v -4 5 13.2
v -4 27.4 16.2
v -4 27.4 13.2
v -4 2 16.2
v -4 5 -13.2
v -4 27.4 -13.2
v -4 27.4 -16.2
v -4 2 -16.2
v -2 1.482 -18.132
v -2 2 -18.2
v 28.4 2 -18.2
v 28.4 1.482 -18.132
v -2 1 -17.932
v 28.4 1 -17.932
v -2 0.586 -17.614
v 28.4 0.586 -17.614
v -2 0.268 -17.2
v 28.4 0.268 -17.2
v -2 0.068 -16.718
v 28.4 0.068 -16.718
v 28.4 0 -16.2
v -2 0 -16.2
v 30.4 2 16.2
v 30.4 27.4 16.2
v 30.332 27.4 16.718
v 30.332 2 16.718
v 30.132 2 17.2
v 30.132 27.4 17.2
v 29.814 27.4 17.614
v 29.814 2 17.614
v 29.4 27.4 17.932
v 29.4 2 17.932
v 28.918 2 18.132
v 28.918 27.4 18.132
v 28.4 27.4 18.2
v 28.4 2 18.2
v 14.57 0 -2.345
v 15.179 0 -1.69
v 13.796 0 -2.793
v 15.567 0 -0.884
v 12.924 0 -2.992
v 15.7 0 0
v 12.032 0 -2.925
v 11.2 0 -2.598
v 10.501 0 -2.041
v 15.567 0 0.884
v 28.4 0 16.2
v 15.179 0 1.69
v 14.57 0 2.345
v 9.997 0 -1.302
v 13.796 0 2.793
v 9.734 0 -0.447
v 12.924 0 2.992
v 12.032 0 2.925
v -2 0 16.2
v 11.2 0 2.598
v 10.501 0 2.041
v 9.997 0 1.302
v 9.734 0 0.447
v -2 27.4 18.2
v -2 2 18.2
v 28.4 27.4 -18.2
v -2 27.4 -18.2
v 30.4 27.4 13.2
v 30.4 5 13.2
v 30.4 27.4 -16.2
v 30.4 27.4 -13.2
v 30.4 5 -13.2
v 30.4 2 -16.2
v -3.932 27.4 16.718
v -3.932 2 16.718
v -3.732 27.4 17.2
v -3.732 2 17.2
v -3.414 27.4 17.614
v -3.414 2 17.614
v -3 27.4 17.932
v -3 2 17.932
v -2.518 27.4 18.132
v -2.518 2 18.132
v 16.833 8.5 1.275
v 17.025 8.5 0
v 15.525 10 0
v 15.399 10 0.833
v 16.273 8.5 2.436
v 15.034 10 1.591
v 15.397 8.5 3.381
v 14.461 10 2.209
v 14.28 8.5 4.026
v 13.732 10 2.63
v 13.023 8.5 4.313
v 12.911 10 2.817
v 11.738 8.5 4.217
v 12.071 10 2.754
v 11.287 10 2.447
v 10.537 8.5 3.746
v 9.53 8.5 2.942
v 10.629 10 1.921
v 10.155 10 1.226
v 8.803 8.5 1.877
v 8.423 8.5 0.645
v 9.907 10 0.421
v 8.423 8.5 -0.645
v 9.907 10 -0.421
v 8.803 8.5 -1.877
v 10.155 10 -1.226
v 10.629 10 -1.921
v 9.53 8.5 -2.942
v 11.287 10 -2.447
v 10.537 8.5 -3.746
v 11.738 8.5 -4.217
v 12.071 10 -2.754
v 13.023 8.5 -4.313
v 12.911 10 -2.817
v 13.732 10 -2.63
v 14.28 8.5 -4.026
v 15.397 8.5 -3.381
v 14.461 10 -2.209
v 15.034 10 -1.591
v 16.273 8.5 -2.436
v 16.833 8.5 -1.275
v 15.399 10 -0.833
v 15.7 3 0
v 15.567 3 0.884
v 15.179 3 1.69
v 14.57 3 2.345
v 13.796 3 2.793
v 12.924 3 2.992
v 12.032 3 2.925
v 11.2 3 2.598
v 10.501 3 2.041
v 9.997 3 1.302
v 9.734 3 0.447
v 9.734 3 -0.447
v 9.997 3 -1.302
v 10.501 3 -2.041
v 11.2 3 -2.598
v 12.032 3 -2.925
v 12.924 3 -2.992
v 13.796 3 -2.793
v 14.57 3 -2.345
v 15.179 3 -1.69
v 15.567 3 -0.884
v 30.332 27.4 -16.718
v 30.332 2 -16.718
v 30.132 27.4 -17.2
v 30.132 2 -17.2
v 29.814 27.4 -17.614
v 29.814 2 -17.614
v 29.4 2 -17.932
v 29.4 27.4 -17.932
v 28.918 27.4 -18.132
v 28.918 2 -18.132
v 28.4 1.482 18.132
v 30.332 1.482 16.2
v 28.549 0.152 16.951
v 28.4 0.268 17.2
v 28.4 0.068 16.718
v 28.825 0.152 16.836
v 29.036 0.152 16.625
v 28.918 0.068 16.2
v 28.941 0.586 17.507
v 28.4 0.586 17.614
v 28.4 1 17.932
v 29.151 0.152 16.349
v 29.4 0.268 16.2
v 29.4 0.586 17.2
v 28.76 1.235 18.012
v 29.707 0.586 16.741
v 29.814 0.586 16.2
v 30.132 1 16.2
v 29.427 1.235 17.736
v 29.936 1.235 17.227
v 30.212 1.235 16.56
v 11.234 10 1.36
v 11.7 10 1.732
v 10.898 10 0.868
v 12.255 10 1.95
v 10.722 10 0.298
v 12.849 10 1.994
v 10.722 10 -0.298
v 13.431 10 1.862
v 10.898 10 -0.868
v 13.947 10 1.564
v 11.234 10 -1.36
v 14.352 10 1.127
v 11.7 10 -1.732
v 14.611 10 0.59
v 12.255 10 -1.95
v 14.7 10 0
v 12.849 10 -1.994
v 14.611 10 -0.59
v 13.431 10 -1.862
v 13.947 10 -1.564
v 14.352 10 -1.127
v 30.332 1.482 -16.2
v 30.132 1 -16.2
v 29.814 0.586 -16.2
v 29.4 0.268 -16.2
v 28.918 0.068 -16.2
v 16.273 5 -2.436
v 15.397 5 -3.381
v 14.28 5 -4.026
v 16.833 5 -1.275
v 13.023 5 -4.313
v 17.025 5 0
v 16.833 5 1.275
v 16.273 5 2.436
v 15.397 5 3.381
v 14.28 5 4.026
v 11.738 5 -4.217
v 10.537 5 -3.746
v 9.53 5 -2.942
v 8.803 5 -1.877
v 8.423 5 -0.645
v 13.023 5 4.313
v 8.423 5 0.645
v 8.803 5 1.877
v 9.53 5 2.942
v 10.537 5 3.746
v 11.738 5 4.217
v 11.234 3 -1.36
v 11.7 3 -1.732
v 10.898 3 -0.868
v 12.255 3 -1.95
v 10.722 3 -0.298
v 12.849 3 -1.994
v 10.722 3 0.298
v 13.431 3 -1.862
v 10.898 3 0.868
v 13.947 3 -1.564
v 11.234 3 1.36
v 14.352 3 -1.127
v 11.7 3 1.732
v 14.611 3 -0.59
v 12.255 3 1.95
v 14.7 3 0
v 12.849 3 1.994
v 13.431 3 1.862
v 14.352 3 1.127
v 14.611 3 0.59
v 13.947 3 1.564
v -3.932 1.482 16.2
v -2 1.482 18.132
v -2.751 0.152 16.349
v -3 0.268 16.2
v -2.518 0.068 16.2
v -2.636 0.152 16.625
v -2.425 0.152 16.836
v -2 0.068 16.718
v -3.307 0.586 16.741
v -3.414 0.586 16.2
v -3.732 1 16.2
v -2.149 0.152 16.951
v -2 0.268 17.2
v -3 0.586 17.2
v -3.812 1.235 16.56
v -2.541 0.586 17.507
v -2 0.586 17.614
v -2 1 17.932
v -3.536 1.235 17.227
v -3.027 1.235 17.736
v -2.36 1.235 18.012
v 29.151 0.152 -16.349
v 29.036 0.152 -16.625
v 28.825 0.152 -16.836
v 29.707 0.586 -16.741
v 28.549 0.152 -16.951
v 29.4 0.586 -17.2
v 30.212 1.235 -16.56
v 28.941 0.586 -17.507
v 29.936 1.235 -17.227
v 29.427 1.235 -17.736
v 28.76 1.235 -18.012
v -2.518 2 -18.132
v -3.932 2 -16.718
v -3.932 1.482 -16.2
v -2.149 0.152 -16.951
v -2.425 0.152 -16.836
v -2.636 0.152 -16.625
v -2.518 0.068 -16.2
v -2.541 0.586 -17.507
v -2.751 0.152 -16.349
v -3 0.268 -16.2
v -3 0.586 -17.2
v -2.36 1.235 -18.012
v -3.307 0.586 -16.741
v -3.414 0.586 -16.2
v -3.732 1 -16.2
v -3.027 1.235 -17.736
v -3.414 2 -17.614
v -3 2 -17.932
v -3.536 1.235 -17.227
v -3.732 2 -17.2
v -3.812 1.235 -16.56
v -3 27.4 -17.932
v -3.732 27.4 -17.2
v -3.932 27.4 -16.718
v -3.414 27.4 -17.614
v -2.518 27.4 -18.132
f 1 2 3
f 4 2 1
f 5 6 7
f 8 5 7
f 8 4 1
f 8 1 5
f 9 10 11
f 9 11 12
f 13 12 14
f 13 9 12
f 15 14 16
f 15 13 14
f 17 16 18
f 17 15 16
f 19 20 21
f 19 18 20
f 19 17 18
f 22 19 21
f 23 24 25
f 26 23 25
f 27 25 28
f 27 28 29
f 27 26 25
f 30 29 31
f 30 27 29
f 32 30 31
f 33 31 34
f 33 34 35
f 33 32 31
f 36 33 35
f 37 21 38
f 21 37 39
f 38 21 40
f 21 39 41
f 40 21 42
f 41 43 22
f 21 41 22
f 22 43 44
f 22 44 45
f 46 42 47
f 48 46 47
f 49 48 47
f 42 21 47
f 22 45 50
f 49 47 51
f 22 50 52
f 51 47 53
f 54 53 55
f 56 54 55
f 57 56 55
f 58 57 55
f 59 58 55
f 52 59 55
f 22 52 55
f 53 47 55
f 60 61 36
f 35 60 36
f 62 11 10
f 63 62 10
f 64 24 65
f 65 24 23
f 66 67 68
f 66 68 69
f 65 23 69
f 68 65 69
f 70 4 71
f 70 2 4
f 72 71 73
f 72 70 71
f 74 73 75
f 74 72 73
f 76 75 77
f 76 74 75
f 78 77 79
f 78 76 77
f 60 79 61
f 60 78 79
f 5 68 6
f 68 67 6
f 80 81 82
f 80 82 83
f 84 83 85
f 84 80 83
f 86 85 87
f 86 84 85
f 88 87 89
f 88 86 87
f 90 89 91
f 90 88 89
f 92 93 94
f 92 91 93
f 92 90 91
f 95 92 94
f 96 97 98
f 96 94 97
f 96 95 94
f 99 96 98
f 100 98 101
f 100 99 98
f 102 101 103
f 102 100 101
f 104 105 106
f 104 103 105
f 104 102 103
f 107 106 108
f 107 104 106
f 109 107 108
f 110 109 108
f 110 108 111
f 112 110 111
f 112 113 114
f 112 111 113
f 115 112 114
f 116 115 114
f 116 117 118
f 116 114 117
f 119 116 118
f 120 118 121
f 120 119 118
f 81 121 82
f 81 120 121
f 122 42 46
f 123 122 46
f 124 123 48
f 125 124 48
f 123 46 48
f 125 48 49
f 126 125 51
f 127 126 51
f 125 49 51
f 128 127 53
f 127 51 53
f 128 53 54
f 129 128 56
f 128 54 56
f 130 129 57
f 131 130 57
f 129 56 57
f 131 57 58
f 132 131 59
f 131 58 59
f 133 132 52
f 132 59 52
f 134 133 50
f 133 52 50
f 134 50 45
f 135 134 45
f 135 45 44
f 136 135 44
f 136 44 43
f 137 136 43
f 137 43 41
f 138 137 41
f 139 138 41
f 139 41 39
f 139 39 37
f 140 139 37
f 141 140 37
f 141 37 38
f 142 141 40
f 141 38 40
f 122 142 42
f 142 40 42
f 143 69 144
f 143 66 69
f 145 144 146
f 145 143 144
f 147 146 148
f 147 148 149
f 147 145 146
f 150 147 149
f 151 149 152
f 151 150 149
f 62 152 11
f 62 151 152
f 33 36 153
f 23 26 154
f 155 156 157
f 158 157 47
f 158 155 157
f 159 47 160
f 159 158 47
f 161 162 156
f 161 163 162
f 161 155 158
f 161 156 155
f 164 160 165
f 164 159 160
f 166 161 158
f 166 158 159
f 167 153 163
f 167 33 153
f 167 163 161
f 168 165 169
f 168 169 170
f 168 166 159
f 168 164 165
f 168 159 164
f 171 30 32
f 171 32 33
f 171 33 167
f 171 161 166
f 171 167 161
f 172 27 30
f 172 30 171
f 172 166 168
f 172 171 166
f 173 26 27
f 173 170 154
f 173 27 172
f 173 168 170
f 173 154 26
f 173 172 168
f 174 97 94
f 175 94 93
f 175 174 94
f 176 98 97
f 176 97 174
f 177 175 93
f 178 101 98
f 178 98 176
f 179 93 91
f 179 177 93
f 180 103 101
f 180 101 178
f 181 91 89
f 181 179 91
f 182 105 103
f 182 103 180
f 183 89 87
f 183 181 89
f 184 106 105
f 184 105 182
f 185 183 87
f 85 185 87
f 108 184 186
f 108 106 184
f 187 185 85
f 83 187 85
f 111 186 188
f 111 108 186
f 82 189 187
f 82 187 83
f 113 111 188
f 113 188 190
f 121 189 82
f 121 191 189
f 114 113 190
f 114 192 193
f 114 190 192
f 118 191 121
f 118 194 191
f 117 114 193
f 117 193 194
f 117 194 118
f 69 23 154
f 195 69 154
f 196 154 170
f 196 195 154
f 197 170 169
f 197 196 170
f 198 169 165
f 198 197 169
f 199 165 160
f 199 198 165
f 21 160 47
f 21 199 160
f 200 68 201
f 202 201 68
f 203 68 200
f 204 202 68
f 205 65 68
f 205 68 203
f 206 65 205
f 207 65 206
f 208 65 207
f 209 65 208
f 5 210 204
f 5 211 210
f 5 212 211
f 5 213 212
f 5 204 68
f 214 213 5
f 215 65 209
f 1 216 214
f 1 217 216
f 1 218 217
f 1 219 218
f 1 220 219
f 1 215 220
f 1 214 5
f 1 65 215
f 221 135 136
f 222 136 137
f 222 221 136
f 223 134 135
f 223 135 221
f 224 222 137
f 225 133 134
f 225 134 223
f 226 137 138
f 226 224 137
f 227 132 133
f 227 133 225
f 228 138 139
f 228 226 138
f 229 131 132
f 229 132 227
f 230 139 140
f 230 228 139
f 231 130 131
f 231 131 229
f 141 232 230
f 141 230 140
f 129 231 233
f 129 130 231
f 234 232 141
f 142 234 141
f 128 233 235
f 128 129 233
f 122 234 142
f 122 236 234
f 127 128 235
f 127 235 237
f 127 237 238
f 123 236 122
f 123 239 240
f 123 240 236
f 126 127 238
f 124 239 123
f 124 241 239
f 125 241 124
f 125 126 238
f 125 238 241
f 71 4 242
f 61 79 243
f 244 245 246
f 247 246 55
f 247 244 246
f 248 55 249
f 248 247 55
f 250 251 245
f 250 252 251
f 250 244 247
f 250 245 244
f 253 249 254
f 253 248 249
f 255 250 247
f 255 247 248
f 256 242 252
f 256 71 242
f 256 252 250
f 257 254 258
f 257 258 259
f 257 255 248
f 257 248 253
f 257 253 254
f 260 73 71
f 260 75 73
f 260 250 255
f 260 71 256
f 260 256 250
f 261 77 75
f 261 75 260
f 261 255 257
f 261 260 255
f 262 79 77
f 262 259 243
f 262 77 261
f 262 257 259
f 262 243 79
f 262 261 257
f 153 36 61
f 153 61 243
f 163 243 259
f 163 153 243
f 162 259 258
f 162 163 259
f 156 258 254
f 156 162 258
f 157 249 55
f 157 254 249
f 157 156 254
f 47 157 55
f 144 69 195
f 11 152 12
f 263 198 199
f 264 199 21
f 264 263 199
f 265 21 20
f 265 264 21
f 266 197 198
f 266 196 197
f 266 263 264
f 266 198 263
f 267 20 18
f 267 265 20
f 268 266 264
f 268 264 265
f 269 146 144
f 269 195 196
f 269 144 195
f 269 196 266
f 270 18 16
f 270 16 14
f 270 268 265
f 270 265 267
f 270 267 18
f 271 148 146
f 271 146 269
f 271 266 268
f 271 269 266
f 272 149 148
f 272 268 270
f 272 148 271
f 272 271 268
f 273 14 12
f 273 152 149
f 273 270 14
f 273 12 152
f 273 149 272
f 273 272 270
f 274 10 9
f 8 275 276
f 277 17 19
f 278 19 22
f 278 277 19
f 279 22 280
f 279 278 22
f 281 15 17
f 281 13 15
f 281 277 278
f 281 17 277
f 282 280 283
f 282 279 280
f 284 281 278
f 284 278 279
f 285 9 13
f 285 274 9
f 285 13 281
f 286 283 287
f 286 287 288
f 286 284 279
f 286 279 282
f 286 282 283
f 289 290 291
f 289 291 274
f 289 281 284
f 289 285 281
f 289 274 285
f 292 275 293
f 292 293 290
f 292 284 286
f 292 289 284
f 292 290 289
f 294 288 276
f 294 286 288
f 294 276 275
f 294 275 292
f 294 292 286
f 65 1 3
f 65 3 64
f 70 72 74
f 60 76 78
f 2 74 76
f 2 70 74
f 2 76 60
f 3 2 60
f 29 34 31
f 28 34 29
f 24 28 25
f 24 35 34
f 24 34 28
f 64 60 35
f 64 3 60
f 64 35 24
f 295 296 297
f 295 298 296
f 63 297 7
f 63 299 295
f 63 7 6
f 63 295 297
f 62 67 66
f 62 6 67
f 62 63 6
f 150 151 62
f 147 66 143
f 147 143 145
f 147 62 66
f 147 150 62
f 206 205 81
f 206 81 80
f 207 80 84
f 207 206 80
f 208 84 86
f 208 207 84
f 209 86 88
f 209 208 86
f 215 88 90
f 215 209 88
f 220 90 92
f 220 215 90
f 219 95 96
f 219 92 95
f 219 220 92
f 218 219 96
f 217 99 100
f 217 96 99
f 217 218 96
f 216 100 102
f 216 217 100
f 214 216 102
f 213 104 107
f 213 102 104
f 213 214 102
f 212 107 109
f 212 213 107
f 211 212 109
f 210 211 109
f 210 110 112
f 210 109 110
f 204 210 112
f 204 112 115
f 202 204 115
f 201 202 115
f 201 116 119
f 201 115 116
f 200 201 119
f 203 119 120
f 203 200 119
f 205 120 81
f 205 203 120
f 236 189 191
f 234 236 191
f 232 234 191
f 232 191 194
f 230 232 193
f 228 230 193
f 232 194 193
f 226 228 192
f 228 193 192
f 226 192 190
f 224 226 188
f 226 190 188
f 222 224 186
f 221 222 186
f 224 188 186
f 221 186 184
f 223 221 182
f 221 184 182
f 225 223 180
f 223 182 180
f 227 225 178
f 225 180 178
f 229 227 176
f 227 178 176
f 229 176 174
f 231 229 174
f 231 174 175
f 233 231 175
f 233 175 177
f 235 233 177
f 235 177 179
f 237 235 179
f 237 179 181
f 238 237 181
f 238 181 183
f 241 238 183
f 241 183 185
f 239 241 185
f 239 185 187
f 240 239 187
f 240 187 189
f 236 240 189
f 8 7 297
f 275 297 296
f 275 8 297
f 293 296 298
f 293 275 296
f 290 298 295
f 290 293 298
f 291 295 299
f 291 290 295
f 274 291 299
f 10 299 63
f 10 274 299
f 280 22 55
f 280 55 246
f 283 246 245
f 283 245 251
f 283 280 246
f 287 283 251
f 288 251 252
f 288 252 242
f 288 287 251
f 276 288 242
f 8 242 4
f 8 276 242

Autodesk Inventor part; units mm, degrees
ref_plane "YZ Plane" through (0, 0, 0) normal (1, 0, 0) x (0, 1, 0)
ref_plane "XZ Plane" through (0, 0, 0) normal (0, 1, 0) x (-1, 0, 0)
ref_plane "XY Plane" through (0, 0, 0) normal (0, 0, 1) x (1, 0, 0)
sketch "Sketch1" plane through (0, 0, 0) normal (0, 1, 0) x (-1, 0, 0)
  line L0 (30.4, 18.2) -> (-30.4, 18.2)
  line L1 (-30.4, 18.2) -> (-30.4, -18.2)
  line L2 (-30.4, -18.2) -> (30.4, -18.2)
  line L3 (30.4, -18.2) -> (30.4, 18.2)
  point P0 (0, 0)
  dimension "d0" = 60.8
  dimension "d1" = 36.4
extrude "Extrusion1" add sketch "Sketch1" along normal blind 5
sketch "Sketch2" plane through (0, 5, 0) normal (0, 1, 0) x (1, 0, 0)
  line L0 (30.4, 18.2) -> (-30.4, 18.2) projected
  line L1 (-30.4, 18.2) -> (-0.4, 18.2)
  line L2 (-0.4, 18.2) -> (-0.4, 13.2)
  line L3 (-0.4, 13.2) -> (-30.4, 13.2)
  line L4 (-30.4, 13.2) -> (-30.4, 18.2)
  line L5 (30.4, -18.2) -> (30.4, 18.2) projected
  line L6 (30.4, -18.2) -> (0.4, -18.2)
  line L7 (0.4, -18.2) -> (0.4, -13.2)
  line L8 (0.4, -13.2) -> (30.4, -13.2)
  line L9 (30.4, -13.2) -> (30.4, -18.2)
  point P0 (0, 0)
  dimension "d4" = 30
  dimension "d5" = 5
  dimension "d6" = 30
  dimension "d7" = 5
extrude "Extrusion2" add sketch "Sketch2" along normal blind 24.4
sketch "Sketch3" plane through (0, 5, 0) normal (0, 1, 0) x (1, 0, 0)
  circle A0 centre (12.7, 0) radius 4.325
  circle A1 centre (-12.7, 0) radius 4.325
  point P0 (0, 0)
  dimension "d10" = 8.65
  dimension "d11" = 8.65
extrude "Extrusion3" add sketch "Sketch3" along normal blind 5
sketch "Sketch4" plane through (-12.7, 10, 0) normal (0, 1, 0) x (1, 0, 0)
  circle A0 centre (0, 0) radius 2
  circle A1 centre (25.4, 0) radius 4.325 projected
  circle A2 centre (25.4, 0) radius 2
  point P0 (12.7, 0)
  dimension "d14" = 4
  dimension "d15" = 4
extrude "Extrusion4" cut sketch "Sketch4" against normal blind 15 contours A0 | A2
sketch "Sketch5" plane through (0, 0, 0) normal (0, -1, 0) x (1, 0, 0)
  circle A0 centre (12.7, 0) radius 2 projected
  circle A1 centre (12.7, 0) radius 3
  circle A2 centre (-12.7, 0) radius 2 projected
  circle A3 centre (-12.7, 0) radius 3
  point P0 (0, 0)
  dimension "d18" = 6
  dimension "d19" = 6
extrude "Extrusion5" cut sketch "Sketch5" against normal blind 3 contours A0 | A1 | A2 | A3
chamfer "Chamfer1" distance 1.5 angle 45 2 edges at (8.375, 10, 0) (-17.025, 10, 0)
sketch "Sketch6" plane through (0, 0, 0) normal (0, -1, 0) x (1, 0, 0)
  line L0 (-28.4, -18.2) -> (28.4, -18.2) projected
  line L1 (30.4, 18.2) -> (-4, 18.2)
  line L2 (-4, 18.2) -> (-4, -18.2)
  line L3 (-4, -18.2) -> (30.4, -18.2)
  line L4 (30.4, -18.2) -> (30.4, 18.2)
  line L5 (1.5875, 26.9875) -> (-34.925, 26.9875)
  line L6 (-34.925, 26.9875) -> (-34.925, -36.5125)
  line L7 (-34.925, -36.5125) -> (1.5875, -36.5125)
  line L8 (1.5875, -36.5125) -> (1.5875, 26.9875)
  point P0 (0, 0)
  point P1 (1.5875, -18.2)
  point P2 (1.5875, 18.2)
  dimension "d26" = 34.4
extrude "Extrusion6" cut sketch "Sketch6" against normal blind 50 contours L0 L8 L7 L6 L5 L1 L2
sketch "Sketch7" plane through (0, 29.4, 0) normal (0, 1, 0) x (1, 0, 0)
  line L0 (30.4, 18.2) -> (-4, 18.2) projected
  line L1 (30.4, -13.2) -> (30.4, 18.2) projected
  line L2 (-4, 18.2) -> (30.4, 18.2)
  line L3 (30.4, 18.2) -> (30.4, 13.2)
  line L4 (30.4, 13.2) -> (-4, 13.2)
  line L5 (-4, 13.2) -> (-4, 18.2)
  line L6 (-4, -18.2) -> (30.4, -18.2) projected
  line L7 (-4, 13.2) -> (-4, -18.2) projected
  line L8 (30.4, -18.2) -> (-4, -18.2)
  line L9 (-4, -18.2) -> (-4, -13.2)
  line L10 (-4, -13.2) -> (30.4, -13.2)
  line L11 (30.4, -13.2) -> (30.4, -18.2)
  point P0 (0, 0)
  dimension "d29" = 5
  dimension "d30" = 5
extrude "Extrusion7" add sketch "Sketch7" against normal blind 27 contours L1 L4 L5 L0 | L11 L6 L7 L10
sketch "Sketch8" plane through (0, 29.4, 0) normal (0, 1, 0) x (1, 0, 0)
  line L0 (-4, -18.2) -> (-4, 18.2) projected
  line L1 (30.4, 13.2) -> (-4, 13.2) projected
  line L2 (-4, 18.2) -> (30.4, 18.2)
  line L3 (30.4, 18.2) -> (30.4, 13.2)
  line L4 (30.4, 13.2) -> (-4, 13.2)
  line L5 (-4, 13.2) -> (-4, 18.2)
  line L6 (-4, -18.2) -> (30.4, -18.2) projected
  line L7 (-4, -13.2) -> (30.4, -13.2) projected
  line L8 (30.4, -18.2) -> (-4, -18.2)
  line L9 (-4, -18.2) -> (-4, -13.2)
  line L10 (-4, -13.2) -> (30.4, -13.2)
  line L11 (30.4, -13.2) -> (30.4, -18.2)
  point P0 (0, 0)
extrude "Extrusion8" cut sketch "Sketch8" against normal blind 2
fillet "Fillet2" radius 2 8 edges at (30.4, 13.7, -18.2) (-4, 13.7, 18.2) (-4, 13.7, -18.2) (30.4, 13.7, 18.2) (30.4, 0, 0) (-4, 0, 0) (13.2, 0, 18.2) (13.2, 0, -18.2)
properties part number "centerMount"
